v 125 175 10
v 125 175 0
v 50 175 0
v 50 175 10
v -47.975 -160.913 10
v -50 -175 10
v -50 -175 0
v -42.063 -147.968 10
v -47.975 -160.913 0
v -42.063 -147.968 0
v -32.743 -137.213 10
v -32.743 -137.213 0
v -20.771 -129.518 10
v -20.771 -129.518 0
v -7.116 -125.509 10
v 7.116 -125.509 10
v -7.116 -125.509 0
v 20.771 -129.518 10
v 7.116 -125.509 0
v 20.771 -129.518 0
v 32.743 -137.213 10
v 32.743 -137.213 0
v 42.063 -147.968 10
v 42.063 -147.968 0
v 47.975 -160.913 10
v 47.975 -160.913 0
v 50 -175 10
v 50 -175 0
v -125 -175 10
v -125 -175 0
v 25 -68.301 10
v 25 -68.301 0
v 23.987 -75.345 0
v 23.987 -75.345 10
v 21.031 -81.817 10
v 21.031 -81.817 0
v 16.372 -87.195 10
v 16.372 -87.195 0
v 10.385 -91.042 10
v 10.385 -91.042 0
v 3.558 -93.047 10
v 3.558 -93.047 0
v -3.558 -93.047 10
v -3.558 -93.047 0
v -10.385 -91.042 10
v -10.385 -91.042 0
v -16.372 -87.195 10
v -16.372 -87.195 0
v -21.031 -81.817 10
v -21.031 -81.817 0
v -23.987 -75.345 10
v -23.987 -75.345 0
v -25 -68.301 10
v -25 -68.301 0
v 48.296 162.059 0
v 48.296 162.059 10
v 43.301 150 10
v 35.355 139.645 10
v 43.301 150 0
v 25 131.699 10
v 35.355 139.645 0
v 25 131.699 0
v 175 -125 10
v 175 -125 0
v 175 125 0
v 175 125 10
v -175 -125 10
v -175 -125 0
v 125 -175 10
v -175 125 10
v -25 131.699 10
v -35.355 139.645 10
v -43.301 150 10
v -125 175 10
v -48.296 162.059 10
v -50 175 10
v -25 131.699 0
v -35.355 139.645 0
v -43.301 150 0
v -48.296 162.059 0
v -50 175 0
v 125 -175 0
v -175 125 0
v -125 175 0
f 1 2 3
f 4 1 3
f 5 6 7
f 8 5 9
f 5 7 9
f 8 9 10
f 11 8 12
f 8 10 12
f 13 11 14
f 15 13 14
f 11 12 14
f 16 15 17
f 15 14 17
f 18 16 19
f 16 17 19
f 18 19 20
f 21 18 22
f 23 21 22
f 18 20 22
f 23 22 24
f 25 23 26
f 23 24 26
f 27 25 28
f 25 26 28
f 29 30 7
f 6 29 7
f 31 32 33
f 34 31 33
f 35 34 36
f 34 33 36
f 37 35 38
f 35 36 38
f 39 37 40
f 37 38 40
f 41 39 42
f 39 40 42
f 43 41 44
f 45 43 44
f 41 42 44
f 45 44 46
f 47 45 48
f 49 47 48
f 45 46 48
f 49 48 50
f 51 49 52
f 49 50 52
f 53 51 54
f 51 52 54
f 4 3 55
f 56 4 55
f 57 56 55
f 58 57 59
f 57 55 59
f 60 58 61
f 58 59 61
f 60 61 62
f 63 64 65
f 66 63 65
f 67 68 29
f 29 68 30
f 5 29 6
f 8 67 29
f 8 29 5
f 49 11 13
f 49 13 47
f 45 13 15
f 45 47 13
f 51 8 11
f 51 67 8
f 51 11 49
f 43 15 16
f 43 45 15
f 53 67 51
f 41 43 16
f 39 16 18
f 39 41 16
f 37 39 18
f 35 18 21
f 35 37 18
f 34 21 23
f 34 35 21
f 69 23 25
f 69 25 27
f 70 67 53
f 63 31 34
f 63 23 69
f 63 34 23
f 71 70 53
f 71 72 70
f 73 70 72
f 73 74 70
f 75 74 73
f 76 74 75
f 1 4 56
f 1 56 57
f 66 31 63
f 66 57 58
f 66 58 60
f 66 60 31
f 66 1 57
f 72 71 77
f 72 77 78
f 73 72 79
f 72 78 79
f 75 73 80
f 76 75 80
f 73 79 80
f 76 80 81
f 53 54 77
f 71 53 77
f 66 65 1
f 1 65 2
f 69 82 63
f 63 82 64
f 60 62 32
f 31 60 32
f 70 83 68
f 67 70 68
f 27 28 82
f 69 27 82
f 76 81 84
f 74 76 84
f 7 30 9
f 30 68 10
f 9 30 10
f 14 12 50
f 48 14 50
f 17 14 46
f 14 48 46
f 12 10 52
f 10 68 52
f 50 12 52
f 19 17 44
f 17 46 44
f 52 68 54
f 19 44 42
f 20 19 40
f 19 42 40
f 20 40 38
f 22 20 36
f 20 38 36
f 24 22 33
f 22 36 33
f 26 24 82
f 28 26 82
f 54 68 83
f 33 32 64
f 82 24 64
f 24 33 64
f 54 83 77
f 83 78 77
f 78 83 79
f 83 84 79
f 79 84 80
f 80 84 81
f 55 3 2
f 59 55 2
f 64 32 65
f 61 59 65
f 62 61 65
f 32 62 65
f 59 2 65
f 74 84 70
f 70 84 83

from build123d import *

# Parameters (mm, degrees)
BOSS_EXTRUDE1_DEPTH = 10


with BuildPart() as part:
    # Sketch1 → Boss-Extrude1 (new body)
    with BuildSketch(Plane.XY):
        with BuildLine():
            Line((125, 175), (50, 175))
            ThreePointArc((50, 175), (43.301270189, 150), (25, 131.698729811))
            Line((25, 131.698729811), (25, -68.301270189))
            ThreePointArc((25, -68.301270189), (0, -93.301270189), (-25, -68.301270189))
            Line((-25, -68.301270189), (-25, 131.698729811))
            ThreePointArc((-25, 131.698729811), (-43.301270189, 150), (-50, 175))
            Line((-50, 175), (-125, 175))
            Line((-125, 175), (-175, 125))
            Line((-175, 125), (-175, -125))
            Line((-175, -125), (-125, -175))
            Line((-125, -175), (-50, -175))
            ThreePointArc((-50, -175), (0, -125), (50, -175))
            Line((50, -175), (125, -175))
            Line((125, -175), (175, -125))
            Line((175, -125), (175, 125))
            Line((175, 125), (125, 175))
        make_face()
    extrude(amount=BOSS_EXTRUDE1_DEPTH)


solid = part.part
